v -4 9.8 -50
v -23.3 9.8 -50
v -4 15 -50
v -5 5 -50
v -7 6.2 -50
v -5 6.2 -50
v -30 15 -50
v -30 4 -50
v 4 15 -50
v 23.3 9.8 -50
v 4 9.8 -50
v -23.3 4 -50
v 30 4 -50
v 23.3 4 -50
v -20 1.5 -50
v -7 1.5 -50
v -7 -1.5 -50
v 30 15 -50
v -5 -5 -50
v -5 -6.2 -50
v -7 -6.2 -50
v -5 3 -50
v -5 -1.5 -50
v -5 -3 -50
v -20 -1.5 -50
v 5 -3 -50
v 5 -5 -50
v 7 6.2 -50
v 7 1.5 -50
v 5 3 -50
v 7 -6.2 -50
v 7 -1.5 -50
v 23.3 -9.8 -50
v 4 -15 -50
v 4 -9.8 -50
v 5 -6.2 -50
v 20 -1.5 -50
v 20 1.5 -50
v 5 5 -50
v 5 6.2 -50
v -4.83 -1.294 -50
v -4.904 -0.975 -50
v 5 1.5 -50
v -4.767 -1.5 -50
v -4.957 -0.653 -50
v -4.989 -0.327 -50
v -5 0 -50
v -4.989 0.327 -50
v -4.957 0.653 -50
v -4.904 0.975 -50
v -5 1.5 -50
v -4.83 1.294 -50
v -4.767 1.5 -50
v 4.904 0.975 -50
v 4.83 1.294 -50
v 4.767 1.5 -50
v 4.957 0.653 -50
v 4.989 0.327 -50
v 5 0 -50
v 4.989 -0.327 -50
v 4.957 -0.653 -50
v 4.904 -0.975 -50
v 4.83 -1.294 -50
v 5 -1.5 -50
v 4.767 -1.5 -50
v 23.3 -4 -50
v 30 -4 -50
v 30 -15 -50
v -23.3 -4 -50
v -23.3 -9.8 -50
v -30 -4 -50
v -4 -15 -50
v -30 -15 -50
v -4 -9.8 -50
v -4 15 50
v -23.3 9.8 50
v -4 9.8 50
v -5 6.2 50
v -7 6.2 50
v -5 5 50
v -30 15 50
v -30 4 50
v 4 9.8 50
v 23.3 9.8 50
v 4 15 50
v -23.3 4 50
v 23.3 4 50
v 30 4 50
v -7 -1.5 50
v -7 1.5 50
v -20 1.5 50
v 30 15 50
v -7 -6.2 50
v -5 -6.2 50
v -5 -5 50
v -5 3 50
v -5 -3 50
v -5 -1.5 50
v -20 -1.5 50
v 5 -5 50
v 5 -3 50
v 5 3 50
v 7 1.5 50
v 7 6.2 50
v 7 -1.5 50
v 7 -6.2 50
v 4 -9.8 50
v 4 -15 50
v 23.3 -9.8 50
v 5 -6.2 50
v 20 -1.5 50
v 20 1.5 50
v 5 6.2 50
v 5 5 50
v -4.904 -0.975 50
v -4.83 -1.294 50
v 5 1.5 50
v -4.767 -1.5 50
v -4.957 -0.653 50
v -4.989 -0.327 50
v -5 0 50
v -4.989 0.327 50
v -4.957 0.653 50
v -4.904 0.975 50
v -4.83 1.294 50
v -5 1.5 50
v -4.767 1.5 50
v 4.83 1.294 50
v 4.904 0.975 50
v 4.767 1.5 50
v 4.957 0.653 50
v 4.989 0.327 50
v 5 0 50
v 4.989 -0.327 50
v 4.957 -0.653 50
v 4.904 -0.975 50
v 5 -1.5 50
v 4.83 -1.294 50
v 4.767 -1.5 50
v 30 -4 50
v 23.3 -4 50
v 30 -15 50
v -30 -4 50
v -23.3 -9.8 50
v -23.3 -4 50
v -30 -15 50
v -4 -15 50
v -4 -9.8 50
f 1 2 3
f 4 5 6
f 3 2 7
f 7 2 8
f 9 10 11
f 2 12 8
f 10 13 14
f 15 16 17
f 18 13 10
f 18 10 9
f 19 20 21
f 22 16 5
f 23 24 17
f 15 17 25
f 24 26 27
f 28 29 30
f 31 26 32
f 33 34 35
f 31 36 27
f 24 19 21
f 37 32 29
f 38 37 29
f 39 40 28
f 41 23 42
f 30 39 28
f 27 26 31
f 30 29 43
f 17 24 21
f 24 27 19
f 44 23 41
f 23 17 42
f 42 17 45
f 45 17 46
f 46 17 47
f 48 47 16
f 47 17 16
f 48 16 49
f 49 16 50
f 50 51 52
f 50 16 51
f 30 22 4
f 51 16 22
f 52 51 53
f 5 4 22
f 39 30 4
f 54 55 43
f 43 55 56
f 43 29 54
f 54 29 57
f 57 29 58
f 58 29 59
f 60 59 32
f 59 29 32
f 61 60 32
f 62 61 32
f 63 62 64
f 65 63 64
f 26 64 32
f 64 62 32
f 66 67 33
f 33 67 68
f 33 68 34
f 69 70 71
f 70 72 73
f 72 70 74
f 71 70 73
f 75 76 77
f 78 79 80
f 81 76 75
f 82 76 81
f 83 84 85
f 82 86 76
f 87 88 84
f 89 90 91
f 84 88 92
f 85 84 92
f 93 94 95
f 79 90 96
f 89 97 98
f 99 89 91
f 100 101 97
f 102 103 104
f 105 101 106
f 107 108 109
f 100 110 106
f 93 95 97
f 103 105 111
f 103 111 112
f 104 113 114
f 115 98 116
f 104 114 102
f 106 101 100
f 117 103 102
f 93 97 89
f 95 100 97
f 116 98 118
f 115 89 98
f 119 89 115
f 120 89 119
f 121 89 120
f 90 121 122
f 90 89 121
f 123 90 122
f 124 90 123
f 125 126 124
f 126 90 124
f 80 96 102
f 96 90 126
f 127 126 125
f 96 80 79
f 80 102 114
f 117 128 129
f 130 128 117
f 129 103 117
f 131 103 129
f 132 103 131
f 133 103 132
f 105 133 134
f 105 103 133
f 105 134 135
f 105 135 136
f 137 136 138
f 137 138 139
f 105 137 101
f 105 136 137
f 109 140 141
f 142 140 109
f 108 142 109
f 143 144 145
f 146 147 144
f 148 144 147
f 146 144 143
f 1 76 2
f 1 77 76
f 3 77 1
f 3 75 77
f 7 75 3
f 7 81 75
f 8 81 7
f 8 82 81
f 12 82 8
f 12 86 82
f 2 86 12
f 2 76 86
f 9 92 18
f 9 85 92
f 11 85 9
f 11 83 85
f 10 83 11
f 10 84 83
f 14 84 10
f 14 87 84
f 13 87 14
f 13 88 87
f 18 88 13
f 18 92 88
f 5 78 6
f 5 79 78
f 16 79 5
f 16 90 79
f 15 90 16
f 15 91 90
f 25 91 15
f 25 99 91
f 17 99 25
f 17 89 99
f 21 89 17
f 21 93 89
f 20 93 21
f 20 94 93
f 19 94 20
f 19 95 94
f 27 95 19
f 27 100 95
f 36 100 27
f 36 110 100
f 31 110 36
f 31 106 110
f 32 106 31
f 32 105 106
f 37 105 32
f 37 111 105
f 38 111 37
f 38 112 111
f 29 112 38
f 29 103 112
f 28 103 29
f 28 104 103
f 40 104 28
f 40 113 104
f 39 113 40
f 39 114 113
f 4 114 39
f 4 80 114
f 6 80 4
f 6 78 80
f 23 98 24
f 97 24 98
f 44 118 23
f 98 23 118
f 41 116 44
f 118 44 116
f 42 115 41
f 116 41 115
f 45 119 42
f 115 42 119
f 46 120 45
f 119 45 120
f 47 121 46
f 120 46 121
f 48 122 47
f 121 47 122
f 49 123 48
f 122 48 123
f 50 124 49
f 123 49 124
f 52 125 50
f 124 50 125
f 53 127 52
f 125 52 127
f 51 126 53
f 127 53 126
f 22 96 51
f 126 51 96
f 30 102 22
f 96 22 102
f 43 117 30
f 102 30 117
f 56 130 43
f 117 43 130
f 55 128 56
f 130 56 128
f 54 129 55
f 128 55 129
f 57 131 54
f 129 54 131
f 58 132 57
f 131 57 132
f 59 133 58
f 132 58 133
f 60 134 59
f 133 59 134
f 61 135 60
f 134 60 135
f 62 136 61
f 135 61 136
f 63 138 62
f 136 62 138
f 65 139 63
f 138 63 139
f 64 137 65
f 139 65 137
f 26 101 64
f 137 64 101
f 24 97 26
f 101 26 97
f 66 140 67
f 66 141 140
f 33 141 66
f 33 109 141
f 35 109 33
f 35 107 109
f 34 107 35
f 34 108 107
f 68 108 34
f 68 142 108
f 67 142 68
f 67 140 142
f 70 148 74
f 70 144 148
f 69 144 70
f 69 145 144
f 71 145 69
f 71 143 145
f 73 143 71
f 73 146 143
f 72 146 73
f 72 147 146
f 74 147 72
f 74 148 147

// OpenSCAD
$fn = 96;

// 30x60 aluminium T-slot extrusion, 100mm long (Z axis)
// Fix: ensure the profile is ONE connected solid by adding small "tie" bridges
// that overlap both halves and the small internal central features by 1–2mm.
module extrusion_30x60(len=100, w=60, h=30) {

    // --- Typical-ish 30-series parameters (kept generic but "standard T-slot-like") ---
    wall      = 2.2;   // outer wall thickness
    web       = 3.0;   // internal web thickness
    bore_r    = 5.0;   // center bore radius (10mm dia)

    // Slot geometry (per face)
    slot_open = 8.0;   // opening at surface
    slot_depth= 7.0;   // depth from surface inward
    slot_neck = 4.2;   // narrower inner neck
    neck_depth= 3.0;   // additional depth for neck

    // Inner cavity sizing (kept inside walls and leaving webs)
    cav_margin_x = 6.0;  // clearance from outer wall to cavity in X
    cav_margin_y = 4.5;  // clearance from outer wall to cavity in Y

    // Small overlap to guarantee watertight connections
    overlap = 1.2;   // 1–2mm as required
    eps     = 0.02;

    // Derived
    half_w = w/2;
    half_h = h/2;

    // Ensure cavity doesn't break walls/webs
    cav_w = max(0, w - 2*(wall + cav_margin_x));
    cav_h = max(0, h - 2*(wall + cav_margin_y));

    // 2D profile (XY), extruded along Z
    module profile2d() {

        // --- Base "as-designed" profile (difference) ---
        module base_profile() {
            difference() {
                // Outer rectangle
                square([w, h], center=true);

                // Center bore
                circle(r=bore_r);

                // T-slots on all four faces (2D cuts)
                // ±X faces
                for (sx = [-1, 1]) {
                    // Main slot pocket
                    translate([sx*(half_w - slot_depth/2 + eps), 0])
                        square([slot_depth + 2*eps, slot_open], center=true);

                    // Neck pocket (deeper, narrower)
                    translate([sx*(half_w - (slot_depth + neck_depth/2) + eps), 0])
                        square([neck_depth + 2*eps, slot_neck], center=true);
                }

                // ±Y faces
                for (sy = [-1, 1]) {
                    translate([0, sy*(half_h - slot_depth/2 + eps)])
                        square([slot_open, slot_depth + 2*eps], center=true);

                    translate([0, sy*(half_h - (slot_depth + neck_depth/2) + eps)])
                        square([slot_neck, neck_depth + 2*eps], center=true);
                }

                // Internal cavities (four quadrants), leaving a central cross-web
                if (cav_w > 0 && cav_h > 0) {
                    cav_half_w = min(cav_w/2, half_w - wall - web/2);
                    cav_half_h = min(cav_h/2, half_h - wall - web/2);

                    if (cav_half_w > 0 && cav_half_h > 0) {
                        for (sx = [-1, 1], sy = [-1, 1]) {
                            translate([sx*(web/2 + cav_half_w/2), sy*(web/2 + cav_half_h/2)])
                                square([cav_half_w, cav_half_h], center=true);
                        }
                    }
                }
            }
        }

        // --- Connectivity fixes (bridges) ---
        // These bridges are placed where the "split halves" and the small internal
        // central pieces were visually disconnected. They overlap both sides by
        // 'overlap' to guarantee a single manifold solid.
        //
        // IMPORTANT: We keep them inside the outer boundary and away from the bore.
        // They are small and do not change the overall external design.

        // Bridge thickness (in Y) kept small so it doesn't noticeably alter the profile.
        bridge_y = 2.0;

        // Place bridges just outside the bore so they don't fill it.
        // They span across X=0 to connect left/right halves.
        // X span: from (bore_r - overlap) to (bore_r + overlap) on both sides => total 2*(bore_r+overlap)
        bridge_x = 2*(bore_r + overlap);

        // Two bridges (top and bottom) to also tie in the small central internal features
        // seen in front/back/left/right views.
        // Y positions chosen to sit within the central region but not collide with the Y-face slot cuts.
        // Keep them well inside half_h - (slot_depth + neck_depth) region.
        safe_y = max(0, half_h - (slot_depth + neck_depth) - 1.0);
        bridge_y_pos = min(safe_y, (web/2 + 3.0));  // near the central web region

        union() {
            base_profile();

            // Central tie bridges (top & bottom), overlapping both halves by 'overlap'
            // These ensure:
            // - left half of extrusion is attached
            // - right half of extrusion is attached
            // - small internal central pieces are attached
            // - no vertical gap between halves in top/bottom views
            for (sy = [-1, 1]) {
                translate([0, sy*bridge_y_pos])
                    square([bridge_x, bridge_y], center=true);
            }

            // Additional small vertical tie to ensure connectivity even if the split is primarily vertical
            // (helps when the gap appears as a long vertical slit in top view).
            // This overlaps the central region without touching the bore.
            // Place it slightly to +X and -X so it doesn't create a single thin line only.
            tie_w = 2.0;
            tie_h = 2*(bore_r + overlap);
            for (sx = [-1, 1]) {
                translate([sx*(bore_r + overlap + tie_w/2 - overlap), 0])
                    square([tie_w, tie_h], center=true);
            }
        }
    }

    // Extrude to length along Z
    linear_extrude(height=len, center=true, convexity=10)
        profile2d();
}

union() {
    extrusion_30x60(len=100, w=60, h=30);
}
